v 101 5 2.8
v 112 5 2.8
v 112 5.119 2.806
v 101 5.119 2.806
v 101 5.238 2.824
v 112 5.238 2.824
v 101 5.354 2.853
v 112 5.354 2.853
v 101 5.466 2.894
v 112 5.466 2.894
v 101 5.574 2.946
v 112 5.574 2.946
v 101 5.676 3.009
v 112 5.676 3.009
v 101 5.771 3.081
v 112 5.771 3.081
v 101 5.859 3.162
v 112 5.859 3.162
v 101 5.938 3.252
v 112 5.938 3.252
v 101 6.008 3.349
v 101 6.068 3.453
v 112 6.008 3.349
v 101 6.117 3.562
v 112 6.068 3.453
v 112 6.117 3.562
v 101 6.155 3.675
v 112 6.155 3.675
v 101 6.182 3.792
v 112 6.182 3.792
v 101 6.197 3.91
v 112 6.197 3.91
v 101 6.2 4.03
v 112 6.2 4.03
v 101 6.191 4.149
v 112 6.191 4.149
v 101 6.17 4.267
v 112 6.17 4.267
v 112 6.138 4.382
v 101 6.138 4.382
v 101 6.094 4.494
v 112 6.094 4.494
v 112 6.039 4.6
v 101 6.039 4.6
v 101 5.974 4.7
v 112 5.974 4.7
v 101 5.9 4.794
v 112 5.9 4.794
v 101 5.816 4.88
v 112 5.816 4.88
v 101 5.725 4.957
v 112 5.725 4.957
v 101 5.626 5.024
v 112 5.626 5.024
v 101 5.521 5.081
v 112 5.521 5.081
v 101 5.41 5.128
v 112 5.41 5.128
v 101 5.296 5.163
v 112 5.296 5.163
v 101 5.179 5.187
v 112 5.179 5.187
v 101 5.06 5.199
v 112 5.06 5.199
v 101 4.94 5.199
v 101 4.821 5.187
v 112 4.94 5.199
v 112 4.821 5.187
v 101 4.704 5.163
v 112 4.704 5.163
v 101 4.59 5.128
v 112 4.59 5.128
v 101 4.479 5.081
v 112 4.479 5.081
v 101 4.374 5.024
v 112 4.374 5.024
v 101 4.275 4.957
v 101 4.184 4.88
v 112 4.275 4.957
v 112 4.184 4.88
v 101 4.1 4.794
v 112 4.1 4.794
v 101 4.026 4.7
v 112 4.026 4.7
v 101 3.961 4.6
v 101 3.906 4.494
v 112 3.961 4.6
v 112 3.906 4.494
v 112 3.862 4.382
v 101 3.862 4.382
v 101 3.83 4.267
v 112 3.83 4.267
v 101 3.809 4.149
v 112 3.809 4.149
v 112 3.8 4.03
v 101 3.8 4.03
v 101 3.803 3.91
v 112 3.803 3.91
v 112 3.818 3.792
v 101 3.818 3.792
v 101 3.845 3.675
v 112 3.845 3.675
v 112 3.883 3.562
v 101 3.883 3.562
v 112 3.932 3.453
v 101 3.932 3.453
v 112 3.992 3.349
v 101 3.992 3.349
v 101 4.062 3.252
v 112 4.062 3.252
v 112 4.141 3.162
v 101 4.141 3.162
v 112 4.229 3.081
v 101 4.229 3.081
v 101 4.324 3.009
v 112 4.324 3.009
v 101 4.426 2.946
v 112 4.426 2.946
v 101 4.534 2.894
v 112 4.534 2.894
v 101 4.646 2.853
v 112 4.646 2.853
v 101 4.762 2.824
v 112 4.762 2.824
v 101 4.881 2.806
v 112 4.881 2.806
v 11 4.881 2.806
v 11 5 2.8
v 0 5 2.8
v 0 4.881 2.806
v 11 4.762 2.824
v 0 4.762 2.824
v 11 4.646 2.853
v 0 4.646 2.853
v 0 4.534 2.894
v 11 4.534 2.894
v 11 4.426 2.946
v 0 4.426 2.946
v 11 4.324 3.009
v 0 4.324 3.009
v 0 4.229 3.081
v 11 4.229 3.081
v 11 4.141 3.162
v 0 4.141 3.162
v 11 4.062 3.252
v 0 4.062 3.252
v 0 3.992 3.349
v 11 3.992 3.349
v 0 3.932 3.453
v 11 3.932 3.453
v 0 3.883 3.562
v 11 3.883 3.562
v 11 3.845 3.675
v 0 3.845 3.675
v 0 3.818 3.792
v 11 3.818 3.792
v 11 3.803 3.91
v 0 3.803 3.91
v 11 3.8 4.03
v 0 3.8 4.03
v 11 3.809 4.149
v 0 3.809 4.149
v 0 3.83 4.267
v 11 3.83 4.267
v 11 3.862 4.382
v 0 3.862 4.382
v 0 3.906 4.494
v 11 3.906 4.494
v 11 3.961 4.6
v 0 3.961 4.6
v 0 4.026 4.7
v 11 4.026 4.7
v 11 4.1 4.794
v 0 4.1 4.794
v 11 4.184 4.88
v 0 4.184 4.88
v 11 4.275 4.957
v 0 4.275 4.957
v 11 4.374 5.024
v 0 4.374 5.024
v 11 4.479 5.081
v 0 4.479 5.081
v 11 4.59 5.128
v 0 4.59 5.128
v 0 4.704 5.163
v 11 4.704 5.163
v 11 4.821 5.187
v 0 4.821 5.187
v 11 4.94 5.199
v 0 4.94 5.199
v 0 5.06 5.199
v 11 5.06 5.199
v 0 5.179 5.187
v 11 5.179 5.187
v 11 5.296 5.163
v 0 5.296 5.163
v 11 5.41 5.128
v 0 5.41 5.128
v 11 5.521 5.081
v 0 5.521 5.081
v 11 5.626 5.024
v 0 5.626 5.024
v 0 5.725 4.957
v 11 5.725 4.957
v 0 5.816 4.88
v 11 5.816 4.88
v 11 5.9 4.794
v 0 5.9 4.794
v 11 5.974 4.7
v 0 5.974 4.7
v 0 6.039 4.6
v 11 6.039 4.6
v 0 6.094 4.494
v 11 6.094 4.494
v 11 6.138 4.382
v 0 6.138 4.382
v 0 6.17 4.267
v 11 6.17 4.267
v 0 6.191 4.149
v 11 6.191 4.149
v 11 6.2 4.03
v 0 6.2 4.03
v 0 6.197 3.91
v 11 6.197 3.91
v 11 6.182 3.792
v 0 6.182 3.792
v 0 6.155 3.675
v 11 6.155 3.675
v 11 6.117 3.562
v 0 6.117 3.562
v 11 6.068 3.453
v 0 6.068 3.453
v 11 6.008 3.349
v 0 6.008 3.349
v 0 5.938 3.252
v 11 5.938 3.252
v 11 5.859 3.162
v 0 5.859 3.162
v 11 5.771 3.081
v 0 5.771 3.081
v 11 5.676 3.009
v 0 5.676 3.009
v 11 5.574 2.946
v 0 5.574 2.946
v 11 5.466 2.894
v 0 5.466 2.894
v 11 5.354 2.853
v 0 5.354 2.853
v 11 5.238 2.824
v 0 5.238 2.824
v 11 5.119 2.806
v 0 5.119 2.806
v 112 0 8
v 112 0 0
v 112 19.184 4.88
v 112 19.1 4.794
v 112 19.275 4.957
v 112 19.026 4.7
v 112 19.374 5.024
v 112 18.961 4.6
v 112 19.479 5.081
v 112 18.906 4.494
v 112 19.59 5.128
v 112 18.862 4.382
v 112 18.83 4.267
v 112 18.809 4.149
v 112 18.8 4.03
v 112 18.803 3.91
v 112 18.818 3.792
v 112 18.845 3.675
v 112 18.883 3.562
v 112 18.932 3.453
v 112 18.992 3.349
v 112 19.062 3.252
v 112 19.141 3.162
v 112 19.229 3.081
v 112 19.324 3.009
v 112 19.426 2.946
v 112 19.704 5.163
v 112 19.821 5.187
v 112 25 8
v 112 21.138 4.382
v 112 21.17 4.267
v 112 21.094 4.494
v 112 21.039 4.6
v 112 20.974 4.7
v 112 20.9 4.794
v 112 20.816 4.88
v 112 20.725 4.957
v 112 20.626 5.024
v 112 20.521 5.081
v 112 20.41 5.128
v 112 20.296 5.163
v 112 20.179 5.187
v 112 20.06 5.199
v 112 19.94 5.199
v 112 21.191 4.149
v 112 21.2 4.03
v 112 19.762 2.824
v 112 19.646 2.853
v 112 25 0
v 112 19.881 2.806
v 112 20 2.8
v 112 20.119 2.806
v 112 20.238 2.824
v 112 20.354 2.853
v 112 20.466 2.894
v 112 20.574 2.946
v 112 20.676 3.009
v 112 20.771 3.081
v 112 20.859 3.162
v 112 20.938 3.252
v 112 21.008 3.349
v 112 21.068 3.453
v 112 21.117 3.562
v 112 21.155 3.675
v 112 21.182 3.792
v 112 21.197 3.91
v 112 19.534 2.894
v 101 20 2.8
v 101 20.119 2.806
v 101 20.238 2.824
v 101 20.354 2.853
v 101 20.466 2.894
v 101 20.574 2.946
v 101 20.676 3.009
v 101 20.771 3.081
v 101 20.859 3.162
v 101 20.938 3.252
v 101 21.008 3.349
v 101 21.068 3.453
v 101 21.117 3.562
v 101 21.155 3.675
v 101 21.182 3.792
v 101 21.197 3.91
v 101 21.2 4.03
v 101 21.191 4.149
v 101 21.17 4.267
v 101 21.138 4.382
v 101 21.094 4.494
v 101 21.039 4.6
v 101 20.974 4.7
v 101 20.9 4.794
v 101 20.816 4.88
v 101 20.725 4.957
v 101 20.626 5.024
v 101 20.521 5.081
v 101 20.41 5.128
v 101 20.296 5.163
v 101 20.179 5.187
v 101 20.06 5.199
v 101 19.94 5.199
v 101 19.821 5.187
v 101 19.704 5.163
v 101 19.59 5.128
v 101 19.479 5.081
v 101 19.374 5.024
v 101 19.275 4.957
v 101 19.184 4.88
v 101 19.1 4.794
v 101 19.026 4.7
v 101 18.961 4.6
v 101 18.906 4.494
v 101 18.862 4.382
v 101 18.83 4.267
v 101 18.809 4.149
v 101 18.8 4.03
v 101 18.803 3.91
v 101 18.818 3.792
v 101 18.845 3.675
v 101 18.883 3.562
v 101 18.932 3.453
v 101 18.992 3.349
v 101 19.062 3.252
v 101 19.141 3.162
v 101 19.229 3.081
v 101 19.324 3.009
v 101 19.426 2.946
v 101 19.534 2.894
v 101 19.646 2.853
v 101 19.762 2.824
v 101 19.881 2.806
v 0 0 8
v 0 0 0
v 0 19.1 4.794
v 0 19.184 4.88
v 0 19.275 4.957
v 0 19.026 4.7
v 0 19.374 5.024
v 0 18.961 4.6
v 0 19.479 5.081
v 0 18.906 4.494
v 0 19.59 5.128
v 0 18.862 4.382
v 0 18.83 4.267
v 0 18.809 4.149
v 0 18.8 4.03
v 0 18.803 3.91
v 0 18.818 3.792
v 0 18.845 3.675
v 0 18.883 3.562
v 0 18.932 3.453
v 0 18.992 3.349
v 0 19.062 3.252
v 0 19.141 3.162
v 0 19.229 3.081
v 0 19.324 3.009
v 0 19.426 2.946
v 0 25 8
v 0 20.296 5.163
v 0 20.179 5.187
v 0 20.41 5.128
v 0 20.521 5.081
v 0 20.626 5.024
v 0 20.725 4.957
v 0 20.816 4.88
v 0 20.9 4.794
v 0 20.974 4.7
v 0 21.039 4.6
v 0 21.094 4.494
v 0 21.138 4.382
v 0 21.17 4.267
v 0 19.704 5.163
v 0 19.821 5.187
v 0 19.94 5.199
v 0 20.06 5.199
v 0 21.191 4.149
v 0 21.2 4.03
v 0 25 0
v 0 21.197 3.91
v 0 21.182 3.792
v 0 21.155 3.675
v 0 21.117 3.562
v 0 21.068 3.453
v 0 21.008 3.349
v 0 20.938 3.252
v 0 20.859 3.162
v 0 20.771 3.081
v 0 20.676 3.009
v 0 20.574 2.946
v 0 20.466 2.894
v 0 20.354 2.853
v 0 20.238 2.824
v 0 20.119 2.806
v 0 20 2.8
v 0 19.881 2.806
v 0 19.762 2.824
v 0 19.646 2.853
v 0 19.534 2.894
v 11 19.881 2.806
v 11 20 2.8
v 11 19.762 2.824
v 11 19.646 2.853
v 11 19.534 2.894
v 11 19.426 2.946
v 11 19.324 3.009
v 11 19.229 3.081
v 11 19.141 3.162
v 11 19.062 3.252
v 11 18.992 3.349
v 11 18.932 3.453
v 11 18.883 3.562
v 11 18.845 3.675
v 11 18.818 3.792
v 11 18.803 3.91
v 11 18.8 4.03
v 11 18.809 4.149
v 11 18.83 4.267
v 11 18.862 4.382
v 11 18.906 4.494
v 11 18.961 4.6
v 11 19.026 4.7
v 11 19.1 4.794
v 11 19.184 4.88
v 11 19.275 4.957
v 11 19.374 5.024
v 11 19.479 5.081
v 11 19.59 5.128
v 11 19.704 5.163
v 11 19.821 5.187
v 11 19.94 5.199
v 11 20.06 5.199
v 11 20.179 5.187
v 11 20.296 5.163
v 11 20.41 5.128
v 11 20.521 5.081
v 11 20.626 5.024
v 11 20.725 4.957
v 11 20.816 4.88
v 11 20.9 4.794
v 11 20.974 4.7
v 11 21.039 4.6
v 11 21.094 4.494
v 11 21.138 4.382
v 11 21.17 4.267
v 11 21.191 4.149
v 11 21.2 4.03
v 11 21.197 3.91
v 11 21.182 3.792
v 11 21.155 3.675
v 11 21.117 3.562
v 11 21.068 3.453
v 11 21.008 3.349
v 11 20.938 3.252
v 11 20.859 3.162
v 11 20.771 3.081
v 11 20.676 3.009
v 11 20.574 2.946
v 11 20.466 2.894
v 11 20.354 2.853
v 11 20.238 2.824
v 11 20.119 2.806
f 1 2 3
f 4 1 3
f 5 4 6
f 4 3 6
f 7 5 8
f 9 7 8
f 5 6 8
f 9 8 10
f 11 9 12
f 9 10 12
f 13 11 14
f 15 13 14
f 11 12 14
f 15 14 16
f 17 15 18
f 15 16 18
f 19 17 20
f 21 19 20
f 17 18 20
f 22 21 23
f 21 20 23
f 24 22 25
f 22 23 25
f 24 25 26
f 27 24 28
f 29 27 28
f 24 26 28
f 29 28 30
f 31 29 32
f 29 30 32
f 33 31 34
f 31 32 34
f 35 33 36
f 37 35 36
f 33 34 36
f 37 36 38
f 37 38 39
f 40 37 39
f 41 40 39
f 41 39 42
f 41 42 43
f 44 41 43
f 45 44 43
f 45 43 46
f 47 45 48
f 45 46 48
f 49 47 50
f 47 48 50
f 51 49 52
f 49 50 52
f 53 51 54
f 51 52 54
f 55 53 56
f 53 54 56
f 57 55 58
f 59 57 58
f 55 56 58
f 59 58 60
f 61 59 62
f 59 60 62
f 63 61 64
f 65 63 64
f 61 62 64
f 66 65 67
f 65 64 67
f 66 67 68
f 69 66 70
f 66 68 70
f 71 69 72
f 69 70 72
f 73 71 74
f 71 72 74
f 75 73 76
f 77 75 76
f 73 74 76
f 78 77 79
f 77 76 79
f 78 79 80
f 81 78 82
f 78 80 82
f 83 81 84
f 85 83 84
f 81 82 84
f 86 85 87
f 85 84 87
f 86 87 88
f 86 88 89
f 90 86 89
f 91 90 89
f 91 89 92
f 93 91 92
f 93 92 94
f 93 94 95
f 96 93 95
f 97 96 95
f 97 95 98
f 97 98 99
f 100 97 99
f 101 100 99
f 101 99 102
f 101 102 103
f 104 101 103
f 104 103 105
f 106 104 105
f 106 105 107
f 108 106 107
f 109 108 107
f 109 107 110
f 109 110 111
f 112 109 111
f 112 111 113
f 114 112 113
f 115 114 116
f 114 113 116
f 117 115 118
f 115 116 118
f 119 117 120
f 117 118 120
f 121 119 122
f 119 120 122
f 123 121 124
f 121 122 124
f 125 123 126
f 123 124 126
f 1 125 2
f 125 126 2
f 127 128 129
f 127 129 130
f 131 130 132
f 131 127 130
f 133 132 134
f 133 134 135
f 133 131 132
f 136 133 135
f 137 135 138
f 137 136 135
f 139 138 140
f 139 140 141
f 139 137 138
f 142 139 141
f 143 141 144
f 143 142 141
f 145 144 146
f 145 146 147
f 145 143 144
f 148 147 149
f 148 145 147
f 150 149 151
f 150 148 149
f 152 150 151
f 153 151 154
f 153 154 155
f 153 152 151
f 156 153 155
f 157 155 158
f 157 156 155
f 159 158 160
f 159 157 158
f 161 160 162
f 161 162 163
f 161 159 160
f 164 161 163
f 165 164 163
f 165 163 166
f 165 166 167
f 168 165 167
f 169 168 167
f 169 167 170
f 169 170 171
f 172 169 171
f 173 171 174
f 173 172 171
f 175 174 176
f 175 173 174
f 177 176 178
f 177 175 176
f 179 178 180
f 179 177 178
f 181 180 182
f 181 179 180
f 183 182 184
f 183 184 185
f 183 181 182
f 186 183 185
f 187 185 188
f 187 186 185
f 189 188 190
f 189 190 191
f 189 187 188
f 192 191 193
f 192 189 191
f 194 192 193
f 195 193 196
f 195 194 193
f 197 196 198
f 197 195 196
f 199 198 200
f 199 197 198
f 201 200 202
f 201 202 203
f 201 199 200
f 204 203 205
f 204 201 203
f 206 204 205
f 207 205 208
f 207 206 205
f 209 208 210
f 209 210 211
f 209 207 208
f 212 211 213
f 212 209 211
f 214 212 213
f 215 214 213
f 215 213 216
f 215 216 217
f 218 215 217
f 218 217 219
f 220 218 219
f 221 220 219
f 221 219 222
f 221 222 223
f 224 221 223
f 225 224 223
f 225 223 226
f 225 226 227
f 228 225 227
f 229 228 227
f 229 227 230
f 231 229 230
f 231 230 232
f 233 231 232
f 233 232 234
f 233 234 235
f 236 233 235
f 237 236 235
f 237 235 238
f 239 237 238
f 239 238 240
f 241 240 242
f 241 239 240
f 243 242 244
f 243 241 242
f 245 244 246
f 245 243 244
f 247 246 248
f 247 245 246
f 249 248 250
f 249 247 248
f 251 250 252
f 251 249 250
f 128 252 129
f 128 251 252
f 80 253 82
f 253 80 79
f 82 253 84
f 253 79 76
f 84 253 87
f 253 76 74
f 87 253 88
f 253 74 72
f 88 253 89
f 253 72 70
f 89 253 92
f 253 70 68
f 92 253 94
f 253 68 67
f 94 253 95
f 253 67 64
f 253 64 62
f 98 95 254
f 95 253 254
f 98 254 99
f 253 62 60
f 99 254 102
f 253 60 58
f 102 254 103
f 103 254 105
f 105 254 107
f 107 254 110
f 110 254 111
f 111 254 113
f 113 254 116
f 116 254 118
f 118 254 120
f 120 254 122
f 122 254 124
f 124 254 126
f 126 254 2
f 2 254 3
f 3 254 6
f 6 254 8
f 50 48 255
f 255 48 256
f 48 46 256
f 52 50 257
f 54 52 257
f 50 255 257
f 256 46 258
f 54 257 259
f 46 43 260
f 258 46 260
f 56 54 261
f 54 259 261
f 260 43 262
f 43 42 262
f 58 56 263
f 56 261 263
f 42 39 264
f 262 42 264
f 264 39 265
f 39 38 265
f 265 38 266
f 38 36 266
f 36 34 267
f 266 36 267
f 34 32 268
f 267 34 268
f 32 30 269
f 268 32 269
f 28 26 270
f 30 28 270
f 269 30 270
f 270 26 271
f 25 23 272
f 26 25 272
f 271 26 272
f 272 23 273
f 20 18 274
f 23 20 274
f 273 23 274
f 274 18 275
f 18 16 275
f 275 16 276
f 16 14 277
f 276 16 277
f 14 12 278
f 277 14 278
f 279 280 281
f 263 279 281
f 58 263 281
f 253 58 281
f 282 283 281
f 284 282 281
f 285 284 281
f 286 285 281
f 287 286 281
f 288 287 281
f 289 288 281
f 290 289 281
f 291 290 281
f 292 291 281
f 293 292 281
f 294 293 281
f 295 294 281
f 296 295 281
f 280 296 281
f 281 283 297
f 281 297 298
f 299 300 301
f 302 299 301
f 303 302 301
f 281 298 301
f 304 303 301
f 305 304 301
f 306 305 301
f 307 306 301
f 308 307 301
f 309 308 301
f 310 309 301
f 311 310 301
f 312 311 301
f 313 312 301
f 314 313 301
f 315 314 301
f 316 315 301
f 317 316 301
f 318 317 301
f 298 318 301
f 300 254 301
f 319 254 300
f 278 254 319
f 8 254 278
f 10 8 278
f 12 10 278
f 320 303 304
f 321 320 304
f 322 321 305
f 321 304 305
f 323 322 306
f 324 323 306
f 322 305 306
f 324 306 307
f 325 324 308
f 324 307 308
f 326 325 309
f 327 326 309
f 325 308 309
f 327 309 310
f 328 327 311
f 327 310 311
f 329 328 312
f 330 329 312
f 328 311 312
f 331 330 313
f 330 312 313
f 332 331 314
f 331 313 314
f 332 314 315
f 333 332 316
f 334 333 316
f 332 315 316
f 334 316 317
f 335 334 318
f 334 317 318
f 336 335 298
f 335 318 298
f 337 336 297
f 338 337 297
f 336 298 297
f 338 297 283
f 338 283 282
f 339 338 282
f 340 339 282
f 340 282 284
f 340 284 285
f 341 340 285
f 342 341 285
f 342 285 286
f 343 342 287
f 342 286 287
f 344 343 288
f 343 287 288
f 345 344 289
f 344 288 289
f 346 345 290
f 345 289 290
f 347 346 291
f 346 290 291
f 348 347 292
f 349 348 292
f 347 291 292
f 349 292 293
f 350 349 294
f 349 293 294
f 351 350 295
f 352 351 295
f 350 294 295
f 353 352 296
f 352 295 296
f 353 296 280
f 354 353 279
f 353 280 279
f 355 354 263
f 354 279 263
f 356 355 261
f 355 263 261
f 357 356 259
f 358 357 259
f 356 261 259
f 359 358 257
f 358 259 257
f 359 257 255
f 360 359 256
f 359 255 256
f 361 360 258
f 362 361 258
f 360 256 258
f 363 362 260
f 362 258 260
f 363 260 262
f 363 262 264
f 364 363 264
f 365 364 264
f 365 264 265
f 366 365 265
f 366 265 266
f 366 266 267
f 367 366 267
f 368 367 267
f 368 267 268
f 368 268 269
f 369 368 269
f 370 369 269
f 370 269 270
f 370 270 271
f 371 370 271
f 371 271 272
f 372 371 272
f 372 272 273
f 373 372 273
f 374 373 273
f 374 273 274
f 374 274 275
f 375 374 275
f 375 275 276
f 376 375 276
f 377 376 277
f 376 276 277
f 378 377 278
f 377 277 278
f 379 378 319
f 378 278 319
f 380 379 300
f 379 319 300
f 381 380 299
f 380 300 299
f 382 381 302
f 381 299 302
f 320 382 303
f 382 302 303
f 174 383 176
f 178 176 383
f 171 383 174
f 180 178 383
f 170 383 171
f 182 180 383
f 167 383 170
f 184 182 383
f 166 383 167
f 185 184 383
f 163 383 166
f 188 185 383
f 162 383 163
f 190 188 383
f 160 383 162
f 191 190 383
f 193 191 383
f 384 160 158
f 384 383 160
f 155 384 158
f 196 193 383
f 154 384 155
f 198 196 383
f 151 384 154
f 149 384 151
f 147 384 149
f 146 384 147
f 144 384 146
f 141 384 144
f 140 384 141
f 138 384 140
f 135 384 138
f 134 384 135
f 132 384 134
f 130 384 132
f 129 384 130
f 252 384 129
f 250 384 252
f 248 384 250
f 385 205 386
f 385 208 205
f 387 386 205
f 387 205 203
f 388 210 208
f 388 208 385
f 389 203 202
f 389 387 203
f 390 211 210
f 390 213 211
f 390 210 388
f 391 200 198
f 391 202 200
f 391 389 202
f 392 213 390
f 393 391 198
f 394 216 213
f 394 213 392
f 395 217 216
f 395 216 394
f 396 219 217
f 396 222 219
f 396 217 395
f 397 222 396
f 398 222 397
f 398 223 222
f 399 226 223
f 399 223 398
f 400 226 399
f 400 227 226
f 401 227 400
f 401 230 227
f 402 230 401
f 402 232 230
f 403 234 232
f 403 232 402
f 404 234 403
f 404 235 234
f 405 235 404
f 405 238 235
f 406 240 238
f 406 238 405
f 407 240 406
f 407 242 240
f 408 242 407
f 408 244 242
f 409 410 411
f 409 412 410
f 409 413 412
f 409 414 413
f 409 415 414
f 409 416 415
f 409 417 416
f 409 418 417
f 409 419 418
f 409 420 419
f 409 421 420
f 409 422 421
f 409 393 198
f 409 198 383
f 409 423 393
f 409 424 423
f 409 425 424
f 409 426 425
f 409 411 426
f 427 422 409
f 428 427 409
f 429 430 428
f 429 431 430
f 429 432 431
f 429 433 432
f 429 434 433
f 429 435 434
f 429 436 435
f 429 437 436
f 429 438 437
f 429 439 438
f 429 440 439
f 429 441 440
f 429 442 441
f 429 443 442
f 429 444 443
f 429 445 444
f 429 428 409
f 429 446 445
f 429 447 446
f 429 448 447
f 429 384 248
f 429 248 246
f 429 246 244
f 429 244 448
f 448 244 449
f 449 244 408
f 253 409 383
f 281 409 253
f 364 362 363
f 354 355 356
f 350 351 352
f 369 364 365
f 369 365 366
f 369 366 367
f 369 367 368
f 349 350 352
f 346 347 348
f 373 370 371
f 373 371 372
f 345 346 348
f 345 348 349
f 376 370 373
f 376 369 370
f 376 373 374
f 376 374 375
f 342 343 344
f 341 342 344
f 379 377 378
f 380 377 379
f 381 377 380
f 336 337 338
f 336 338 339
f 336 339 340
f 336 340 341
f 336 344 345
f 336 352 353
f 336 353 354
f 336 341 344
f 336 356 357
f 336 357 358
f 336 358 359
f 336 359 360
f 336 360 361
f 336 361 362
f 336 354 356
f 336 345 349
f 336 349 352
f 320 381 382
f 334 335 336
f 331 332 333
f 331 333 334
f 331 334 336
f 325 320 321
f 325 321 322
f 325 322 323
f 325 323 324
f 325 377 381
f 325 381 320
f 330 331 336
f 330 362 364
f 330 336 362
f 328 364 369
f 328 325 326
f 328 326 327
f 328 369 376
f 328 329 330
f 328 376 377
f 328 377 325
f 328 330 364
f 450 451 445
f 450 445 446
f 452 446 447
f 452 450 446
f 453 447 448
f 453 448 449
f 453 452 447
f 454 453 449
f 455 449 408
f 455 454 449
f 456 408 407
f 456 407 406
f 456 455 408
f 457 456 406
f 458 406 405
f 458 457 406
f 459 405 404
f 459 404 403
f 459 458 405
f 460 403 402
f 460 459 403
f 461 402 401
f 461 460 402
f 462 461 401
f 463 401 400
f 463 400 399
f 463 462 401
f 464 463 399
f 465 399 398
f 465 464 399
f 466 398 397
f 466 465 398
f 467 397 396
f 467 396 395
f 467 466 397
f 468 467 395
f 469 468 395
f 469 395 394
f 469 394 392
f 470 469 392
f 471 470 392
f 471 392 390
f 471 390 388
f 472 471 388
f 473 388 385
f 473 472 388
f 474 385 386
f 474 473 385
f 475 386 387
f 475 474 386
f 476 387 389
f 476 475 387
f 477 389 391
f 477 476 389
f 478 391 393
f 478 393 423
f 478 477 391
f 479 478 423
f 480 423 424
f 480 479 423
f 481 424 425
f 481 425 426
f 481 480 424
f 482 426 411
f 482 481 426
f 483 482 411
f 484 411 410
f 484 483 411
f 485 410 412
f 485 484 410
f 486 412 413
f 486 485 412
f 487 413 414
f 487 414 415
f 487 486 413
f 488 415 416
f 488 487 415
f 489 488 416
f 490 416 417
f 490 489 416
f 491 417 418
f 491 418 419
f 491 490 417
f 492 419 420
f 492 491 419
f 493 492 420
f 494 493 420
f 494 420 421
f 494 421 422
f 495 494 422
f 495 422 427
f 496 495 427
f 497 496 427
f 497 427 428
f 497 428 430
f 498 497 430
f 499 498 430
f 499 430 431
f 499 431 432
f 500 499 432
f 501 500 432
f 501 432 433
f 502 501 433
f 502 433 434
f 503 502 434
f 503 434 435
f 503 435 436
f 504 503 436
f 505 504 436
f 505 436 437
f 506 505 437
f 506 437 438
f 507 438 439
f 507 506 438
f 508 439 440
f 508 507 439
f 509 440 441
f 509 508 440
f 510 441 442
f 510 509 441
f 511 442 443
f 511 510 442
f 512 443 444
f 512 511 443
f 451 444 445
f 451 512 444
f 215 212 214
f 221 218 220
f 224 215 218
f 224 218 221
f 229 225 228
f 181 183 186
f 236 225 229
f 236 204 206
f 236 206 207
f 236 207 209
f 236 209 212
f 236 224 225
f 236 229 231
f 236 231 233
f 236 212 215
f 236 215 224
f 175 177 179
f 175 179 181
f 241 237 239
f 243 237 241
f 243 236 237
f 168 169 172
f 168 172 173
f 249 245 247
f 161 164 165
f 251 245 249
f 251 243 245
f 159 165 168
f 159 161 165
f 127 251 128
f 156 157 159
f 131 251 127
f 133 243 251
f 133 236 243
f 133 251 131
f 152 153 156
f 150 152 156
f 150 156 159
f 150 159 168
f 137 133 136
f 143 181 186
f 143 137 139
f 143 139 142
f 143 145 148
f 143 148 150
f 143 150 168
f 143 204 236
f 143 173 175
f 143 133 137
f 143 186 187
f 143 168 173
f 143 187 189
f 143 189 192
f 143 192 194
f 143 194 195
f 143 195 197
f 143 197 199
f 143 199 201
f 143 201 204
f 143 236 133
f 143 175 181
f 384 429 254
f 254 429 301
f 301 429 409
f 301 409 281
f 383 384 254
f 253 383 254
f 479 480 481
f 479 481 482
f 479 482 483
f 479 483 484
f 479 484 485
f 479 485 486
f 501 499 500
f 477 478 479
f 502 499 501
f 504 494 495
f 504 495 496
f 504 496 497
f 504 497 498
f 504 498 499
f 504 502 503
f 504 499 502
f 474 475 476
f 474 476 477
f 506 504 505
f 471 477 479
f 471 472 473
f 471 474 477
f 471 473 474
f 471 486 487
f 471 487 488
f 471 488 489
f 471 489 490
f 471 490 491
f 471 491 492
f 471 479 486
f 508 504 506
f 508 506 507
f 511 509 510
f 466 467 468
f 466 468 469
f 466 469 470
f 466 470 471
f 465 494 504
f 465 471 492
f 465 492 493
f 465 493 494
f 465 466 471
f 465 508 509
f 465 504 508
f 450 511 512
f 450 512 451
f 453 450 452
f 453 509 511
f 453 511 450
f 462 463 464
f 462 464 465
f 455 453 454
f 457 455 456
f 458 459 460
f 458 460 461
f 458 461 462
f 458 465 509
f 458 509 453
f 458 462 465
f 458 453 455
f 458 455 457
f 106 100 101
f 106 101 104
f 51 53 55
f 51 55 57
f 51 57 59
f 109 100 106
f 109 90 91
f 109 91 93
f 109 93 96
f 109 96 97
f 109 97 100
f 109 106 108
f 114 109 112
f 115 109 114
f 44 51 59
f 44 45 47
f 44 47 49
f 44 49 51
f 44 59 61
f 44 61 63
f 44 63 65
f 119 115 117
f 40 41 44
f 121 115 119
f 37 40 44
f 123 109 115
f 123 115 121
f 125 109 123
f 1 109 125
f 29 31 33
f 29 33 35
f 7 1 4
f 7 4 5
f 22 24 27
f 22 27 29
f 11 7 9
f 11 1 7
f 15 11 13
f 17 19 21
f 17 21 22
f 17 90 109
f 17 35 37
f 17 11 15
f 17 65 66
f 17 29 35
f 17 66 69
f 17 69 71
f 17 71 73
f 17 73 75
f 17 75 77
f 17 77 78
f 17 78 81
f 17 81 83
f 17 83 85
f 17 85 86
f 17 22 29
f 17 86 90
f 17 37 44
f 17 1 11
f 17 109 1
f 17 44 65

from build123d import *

# Parameters (mm, degrees)
ESQUISSE1_W             = 112
ESQUISSE1_H             = 25
BASE_EXTRUSION_DEPTH    = 8
ESQUISSE2_R             = 1.2
ENL_V_MAT_EXTRU_1_DEPTH = 11
ENL_V_START             = -11
ESQUISSE3_R             = 1.2
ENL_V_MAT_EXTRU_2_DEPTH = 11


with BuildPart() as part:
    # Esquisse1 → Base-Extrusion (new body)
    with BuildSketch(Plane.XY):
        with Locations((56, 12.5)):
            Rectangle(ESQUISSE1_W, ESQUISSE1_H)
    extrude(amount=BASE_EXTRUSION_DEPTH)

    # Esquisse2 → Enlèv. mat.-Extru.1 (cut)
    with BuildSketch(Plane(origin=(112, 0, 0), x_dir=(0, 0, -1), z_dir=(1, 0, 0))):
        with Locations((-4, 20)):
            Circle(ESQUISSE2_R)
        with Locations((-4, 5)):
            Circle(ESQUISSE2_R)
    extrude(amount=-ENL_V_MAT_EXTRU_1_DEPTH, mode=Mode.SUBTRACT)

    # Esquisse3 → Enlèv. mat.-Extru.2 (cut)
    with BuildSketch(Plane.ZY.offset(ENL_V_START)):
        with Locations(Location((4, 20, 0), (0, 0, 180))):
            Circle(ESQUISSE3_R)
        with Locations(Location((4, 5, 0), (0, 0, 180))):
            Circle(ESQUISSE3_R)
    extrude(amount=ENL_V_MAT_EXTRU_2_DEPTH, mode=Mode.SUBTRACT)


solid = part.part
